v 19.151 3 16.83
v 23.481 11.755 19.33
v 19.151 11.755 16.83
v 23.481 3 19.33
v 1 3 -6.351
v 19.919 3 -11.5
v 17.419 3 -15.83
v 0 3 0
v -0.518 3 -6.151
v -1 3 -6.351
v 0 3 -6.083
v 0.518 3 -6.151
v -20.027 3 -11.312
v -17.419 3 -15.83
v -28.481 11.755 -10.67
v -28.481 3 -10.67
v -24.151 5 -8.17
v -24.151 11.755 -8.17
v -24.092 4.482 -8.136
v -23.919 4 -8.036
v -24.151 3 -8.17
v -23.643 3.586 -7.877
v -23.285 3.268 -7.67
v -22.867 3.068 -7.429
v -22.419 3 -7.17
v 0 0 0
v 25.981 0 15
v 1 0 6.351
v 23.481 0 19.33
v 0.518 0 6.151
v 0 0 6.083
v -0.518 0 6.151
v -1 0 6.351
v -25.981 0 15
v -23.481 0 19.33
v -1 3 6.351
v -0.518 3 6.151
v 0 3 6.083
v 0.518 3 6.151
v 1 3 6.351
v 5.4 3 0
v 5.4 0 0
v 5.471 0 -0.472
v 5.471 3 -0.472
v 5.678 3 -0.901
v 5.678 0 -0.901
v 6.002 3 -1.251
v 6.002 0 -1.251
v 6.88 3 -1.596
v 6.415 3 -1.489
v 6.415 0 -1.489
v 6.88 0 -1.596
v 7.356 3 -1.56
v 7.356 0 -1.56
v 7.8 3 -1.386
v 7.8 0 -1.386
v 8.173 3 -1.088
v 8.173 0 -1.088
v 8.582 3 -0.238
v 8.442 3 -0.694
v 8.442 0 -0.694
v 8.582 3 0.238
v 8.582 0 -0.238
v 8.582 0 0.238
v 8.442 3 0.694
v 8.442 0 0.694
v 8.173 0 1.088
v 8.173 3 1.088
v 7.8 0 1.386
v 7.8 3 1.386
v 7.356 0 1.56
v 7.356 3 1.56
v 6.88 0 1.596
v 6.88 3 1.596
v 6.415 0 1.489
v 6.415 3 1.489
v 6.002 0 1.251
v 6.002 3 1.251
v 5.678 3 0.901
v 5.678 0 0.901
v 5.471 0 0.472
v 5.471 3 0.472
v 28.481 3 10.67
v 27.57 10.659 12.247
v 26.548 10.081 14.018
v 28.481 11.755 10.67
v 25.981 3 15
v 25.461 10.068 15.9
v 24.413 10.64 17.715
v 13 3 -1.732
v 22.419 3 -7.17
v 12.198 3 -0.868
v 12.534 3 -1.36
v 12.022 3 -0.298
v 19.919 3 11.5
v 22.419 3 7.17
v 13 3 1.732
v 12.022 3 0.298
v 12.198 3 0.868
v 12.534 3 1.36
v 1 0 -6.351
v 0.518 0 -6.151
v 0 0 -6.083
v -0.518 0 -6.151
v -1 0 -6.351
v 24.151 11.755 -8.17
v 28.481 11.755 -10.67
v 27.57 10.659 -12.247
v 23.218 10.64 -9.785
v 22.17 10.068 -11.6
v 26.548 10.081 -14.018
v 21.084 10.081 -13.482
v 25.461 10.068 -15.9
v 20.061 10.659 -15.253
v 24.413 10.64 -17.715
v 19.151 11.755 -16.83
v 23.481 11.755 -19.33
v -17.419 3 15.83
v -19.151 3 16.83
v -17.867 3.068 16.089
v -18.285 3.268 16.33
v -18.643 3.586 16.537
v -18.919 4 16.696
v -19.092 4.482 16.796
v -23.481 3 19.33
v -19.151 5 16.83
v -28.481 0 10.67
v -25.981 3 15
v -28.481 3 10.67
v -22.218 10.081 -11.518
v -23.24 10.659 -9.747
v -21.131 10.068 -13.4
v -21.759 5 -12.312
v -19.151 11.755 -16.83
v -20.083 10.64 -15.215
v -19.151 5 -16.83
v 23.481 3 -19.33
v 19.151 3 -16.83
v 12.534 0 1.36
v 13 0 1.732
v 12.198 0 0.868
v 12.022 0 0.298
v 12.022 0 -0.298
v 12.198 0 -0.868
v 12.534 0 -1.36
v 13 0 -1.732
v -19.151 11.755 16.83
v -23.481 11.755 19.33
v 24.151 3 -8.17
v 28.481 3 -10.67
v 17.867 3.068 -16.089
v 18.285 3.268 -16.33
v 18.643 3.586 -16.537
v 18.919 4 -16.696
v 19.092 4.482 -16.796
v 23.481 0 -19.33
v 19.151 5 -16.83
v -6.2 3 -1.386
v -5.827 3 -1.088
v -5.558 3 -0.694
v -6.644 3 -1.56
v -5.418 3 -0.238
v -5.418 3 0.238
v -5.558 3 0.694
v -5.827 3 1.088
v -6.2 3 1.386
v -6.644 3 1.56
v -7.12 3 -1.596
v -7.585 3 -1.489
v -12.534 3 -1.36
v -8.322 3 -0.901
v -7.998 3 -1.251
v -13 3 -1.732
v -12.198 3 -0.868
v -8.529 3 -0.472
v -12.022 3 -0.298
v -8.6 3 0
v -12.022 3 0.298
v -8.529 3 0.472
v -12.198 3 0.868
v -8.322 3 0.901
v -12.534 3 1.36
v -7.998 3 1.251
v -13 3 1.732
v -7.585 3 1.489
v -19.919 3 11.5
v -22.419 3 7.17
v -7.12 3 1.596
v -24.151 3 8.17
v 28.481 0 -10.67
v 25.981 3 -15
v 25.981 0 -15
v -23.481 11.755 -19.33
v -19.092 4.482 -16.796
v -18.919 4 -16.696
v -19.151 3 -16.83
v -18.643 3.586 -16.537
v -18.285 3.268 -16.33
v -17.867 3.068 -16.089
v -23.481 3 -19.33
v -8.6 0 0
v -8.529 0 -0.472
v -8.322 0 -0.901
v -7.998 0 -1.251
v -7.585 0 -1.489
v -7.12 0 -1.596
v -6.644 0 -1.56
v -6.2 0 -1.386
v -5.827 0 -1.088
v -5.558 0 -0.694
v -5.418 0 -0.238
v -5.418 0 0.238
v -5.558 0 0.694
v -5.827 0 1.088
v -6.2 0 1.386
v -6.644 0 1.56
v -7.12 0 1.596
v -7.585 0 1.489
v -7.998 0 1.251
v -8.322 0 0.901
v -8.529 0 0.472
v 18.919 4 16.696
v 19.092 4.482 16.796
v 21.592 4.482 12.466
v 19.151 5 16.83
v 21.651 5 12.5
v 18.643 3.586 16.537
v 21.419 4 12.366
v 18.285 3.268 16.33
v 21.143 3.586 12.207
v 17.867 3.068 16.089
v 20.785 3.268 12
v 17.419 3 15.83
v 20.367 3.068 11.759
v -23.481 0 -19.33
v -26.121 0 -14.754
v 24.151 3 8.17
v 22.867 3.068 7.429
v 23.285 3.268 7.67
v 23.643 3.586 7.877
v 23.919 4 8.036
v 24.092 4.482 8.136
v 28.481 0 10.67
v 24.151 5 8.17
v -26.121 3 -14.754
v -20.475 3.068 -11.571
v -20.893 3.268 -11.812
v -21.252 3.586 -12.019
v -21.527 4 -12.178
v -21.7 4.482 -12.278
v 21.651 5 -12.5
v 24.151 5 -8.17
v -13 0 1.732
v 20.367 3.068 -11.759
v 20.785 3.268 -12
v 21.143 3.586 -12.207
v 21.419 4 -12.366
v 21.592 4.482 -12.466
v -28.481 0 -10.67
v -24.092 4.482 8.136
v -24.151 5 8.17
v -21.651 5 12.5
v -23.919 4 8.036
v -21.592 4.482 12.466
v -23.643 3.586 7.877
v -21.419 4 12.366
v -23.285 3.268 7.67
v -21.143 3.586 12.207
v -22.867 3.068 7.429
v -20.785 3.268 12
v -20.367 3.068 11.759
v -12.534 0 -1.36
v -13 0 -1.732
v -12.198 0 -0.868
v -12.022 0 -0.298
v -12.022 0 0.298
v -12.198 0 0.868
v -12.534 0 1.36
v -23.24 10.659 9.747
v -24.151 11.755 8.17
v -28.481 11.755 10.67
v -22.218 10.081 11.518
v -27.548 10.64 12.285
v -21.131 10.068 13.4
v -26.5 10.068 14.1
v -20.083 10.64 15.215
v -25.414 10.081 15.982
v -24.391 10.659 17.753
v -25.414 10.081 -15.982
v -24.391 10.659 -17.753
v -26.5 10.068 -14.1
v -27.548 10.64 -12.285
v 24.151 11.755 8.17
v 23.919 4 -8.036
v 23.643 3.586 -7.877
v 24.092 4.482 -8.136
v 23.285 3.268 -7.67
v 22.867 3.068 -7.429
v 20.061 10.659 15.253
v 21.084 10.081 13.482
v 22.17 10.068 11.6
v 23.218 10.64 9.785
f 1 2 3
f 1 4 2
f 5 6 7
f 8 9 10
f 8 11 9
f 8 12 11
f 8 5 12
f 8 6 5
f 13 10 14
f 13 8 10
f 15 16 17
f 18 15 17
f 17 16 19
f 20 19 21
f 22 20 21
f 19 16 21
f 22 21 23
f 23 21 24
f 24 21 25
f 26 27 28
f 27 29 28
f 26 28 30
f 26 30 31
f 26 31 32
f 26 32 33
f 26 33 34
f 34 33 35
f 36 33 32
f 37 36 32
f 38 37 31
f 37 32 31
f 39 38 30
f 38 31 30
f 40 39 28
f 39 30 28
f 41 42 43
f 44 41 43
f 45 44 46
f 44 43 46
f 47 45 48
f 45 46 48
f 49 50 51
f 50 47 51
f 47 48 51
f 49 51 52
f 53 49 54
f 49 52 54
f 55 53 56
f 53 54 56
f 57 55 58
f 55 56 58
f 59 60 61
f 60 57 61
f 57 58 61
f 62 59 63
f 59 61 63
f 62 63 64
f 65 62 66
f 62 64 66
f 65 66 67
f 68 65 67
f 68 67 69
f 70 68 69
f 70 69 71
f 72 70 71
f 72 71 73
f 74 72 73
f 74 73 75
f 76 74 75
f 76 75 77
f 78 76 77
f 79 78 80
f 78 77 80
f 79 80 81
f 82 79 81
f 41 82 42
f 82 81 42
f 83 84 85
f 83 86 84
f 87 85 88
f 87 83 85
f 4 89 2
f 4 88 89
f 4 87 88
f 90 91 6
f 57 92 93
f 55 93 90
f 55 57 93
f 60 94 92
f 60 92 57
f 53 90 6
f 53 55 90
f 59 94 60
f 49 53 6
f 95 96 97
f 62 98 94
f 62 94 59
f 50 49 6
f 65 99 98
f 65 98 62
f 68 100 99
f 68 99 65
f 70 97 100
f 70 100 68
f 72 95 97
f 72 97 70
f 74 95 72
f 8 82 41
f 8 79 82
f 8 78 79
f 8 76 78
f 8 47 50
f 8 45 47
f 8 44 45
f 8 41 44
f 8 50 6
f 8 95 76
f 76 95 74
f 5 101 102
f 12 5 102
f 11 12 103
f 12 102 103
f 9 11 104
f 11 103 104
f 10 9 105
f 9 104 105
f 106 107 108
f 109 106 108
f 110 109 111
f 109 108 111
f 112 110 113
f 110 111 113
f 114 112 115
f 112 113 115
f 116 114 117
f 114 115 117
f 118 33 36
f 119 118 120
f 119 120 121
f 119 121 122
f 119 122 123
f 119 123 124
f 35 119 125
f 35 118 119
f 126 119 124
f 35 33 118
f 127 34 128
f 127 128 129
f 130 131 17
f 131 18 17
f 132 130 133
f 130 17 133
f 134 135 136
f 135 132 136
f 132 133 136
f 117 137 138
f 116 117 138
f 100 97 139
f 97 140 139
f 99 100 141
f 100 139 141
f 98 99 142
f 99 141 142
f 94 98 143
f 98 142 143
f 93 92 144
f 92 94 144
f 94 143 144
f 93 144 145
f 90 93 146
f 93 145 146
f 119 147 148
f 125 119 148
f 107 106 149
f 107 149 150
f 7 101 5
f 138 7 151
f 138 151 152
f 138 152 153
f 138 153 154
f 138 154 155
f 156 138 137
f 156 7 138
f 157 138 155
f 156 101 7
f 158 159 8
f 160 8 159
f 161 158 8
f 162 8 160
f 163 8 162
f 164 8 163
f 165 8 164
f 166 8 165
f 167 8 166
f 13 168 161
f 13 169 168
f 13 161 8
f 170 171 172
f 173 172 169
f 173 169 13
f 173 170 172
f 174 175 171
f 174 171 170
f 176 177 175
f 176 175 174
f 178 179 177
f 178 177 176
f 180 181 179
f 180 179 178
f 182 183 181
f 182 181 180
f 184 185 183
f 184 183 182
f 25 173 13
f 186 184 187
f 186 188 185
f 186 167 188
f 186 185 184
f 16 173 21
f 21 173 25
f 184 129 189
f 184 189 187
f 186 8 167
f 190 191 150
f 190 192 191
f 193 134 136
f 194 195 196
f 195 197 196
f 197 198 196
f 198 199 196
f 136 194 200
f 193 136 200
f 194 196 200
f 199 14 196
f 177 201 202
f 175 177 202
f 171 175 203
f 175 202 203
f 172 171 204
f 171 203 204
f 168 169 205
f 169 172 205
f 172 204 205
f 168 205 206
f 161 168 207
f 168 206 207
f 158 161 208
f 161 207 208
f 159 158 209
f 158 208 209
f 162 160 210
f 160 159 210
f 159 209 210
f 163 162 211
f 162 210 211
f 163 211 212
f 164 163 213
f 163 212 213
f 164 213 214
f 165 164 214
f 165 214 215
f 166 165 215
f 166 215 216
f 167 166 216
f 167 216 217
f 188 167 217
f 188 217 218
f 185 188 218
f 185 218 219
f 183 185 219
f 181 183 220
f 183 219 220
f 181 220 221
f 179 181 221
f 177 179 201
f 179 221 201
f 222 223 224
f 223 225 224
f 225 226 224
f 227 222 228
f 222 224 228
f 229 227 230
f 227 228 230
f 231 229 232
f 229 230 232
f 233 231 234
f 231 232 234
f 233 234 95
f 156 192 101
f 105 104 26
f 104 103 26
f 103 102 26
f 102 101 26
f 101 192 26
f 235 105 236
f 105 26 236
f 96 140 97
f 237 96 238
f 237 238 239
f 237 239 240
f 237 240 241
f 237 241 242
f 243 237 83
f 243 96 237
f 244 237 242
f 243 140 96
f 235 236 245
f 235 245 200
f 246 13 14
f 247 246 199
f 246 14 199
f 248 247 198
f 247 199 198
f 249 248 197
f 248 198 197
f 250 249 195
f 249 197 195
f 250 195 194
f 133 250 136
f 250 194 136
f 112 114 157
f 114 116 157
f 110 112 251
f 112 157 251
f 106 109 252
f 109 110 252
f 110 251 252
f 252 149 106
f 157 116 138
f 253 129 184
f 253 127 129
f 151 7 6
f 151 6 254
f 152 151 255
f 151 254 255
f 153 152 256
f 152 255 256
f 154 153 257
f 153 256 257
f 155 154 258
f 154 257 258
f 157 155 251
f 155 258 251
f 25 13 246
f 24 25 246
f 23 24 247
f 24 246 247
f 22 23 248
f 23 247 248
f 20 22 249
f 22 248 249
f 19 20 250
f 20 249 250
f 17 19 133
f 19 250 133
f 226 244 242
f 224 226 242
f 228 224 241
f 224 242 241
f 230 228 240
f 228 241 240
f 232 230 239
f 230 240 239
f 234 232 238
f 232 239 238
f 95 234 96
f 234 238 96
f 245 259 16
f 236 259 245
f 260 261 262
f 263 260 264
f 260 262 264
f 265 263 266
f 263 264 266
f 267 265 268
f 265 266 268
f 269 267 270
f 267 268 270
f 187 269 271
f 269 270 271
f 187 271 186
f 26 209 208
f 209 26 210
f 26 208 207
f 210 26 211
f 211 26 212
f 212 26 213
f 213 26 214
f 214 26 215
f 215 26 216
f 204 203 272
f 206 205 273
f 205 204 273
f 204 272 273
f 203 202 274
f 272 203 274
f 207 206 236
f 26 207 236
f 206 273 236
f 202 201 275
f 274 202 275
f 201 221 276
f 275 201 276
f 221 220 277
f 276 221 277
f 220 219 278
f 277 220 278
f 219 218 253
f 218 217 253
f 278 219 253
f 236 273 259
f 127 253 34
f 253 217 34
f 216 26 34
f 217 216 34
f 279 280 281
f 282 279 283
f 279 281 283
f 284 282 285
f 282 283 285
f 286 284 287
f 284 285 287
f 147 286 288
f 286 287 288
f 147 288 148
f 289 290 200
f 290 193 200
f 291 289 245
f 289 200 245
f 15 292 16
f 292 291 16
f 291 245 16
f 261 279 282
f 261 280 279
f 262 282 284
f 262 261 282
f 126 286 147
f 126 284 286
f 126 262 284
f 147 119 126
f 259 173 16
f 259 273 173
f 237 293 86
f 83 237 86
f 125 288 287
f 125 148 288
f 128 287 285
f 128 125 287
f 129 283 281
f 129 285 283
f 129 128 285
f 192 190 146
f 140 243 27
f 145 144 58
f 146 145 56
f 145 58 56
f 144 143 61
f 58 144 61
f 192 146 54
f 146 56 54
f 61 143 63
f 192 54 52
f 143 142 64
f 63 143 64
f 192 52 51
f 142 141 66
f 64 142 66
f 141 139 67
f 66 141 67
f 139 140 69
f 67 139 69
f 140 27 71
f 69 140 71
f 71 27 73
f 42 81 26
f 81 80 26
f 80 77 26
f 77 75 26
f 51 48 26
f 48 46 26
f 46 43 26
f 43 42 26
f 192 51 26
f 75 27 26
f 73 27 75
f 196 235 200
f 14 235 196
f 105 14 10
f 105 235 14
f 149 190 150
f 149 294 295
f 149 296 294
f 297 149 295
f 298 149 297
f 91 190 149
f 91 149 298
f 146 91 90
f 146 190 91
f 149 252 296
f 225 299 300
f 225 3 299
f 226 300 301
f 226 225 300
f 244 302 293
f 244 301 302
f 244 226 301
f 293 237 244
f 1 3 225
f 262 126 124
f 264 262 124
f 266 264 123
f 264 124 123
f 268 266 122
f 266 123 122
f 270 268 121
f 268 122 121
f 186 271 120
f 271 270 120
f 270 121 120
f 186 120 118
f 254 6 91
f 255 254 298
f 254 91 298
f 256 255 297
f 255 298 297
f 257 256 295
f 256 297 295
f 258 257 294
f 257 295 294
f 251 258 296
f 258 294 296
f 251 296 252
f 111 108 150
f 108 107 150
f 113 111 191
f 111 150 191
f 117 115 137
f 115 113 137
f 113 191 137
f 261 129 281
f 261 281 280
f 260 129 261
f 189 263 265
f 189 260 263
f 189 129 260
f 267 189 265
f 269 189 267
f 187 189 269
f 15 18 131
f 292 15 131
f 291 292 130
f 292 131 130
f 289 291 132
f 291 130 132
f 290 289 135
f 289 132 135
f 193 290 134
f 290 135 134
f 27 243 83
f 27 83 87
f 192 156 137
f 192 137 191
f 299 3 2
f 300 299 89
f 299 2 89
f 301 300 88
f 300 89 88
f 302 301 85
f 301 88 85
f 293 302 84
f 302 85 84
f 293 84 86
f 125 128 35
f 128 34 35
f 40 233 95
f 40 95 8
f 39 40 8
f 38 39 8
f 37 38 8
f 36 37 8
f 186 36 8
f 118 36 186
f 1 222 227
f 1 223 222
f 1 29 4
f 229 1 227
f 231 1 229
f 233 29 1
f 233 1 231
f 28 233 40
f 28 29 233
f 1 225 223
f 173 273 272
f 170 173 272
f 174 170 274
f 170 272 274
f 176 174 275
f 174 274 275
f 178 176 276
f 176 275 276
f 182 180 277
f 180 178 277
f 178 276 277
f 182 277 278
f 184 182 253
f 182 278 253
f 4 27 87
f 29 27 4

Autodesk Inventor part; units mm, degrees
ref_plane "YZ Plane" through (0, 0, 0) normal (1, 0, 0) x (0, 1, 0)
ref_plane "XZ Plane" through (0, 0, 0) normal (0, 1, 0) x (-1, 0, 0)
ref_plane "XY Plane" through (0, 0, 0) normal (0, 0, 1) x (1, 0, 0)
sketch "Sketch1" plane through (0, 0, 0) normal (0, 1, 0) x (-1, 0, 0)
  arc A0 (-1, 6.3509) -> (1, 6.3509) centre (0, 8.0829) ccw
  arc A1 (-12.9998, -1.7321) -> (-12.9998, 1.7321) centre (-13.9998, 0) ccw
  arc A2 (1, -6.3509) -> (-1, -6.3509) centre (0, -8.0829) ccw
  arc A3 (13, 1.7321) -> (13, -1.7321) centre (14, 0) ccw
  circle A4 centre (7, 0) radius 1.6
  circle A5 centre (-7, 0) radius 1.6
  line L0 (0, 0) -> (26.1212, -14.7541)
  line L1 (0, 0) -> (25.9808, 15)
  line L2 (0, 0) -> (30, 0) construction
  line L3 (0, 0) -> (-25.9808, -15)
  line L4 (0, 0) -> (-25.9808, 15)
  line L5 (0, 0) -> (30, 0) construction
  line L6 (25.9808, 15) -> (28.4808, 10.6699)
  line L7 (25.9808, 15) -> (23.4808, 19.3301)
  line L8 (1, 6.3509) -> (23.4808, 19.3301)
  line L9 (28.4808, 10.6699) -> (13, 1.7321)
  line L10 (13, -1.7321) -> (28.4808, -10.6699)
  line L11 (28.4808, -10.6699) -> (23.4808, -19.3301)
  line L12 (23.4808, -19.3301) -> (1, -6.3509)
  line L13 (-1, -6.3509) -> (-23.4808, -19.3301)
  line L14 (-23.4808, -19.3301) -> (-28.4807, -10.6699)
  line L15 (-28.4807, -10.6699) -> (-12.9998, -1.7321)
  line L16 (-12.9998, 1.7321) -> (-28.4807, 10.6699)
  line L17 (-28.4807, 10.6699) -> (-23.4808, 19.3301)
  line L18 (-23.4808, 19.3301) -> (-1, 6.3509)
  dimension "d0" = 3.2
  dimension "d1" = 30
  dimension "d2" = 30
  dimension "d3" = 30
  dimension "d4" = 30
  dimension "d5" = 30
  dimension "d6" = 150
extrude "Extrusion1" add sketch "Sketch1" along normal blind 3
sketch "Sketch2" plane through (0, 3, 0) normal (0, 1, 0) x (1, 0, 0)
  line L0 (-23.4808, -19.3301) -> (-28.4808, -10.6699)
  line L1 (-28.4808, -10.6699) -> (-24.1506, -8.1699)
  line L2 (-24.1506, -8.1699) -> (-19.1506, -16.8301)
  line L3 (-19.1506, -16.8301) -> (-23.4808, -19.3301)
  line L4 (-28.4808, -10.6699) -> (-23.4808, -19.3301) projected
  line L5 (-23.4808, 19.3301) -> (-28.4808, 10.6699)
  line L6 (-28.4808, 10.6699) -> (-24.1506, 8.1699)
  line L7 (-24.1506, 8.1699) -> (-19.1506, 16.8301)
  line L8 (-19.1506, 16.8301) -> (-23.4808, 19.3301)
  line L9 (-1, 6.3509) -> (-23.4808, 19.3301) projected
  line L10 (28.4807, 10.6699) -> (23.4808, 19.3301)
  line L11 (23.4808, 19.3301) -> (19.1506, 16.8301)
  line L12 (19.1506, 16.8301) -> (24.1506, 8.1699)
  line L13 (24.1506, 8.1699) -> (28.4807, 10.6699)
  line L14 (28.4807, -10.6699) -> (23.4808, -19.3301)
  line L15 (23.4808, -19.3301) -> (19.1506, -16.8301)
  line L16 (19.1506, -16.8301) -> (24.1506, -8.1699)
  line L17 (24.1506, -8.1699) -> (28.4807, -10.6699)
  line L18 (23.4808, -19.3301) -> (28.4807, -10.6699) projected
  point P0 (0, 0)
  dimension "d9" = 5
  dimension "d10" = 5
  dimension "d11" = 5
  dimension "d12" = 5
extrude "Extrusion2" add sketch "Sketch2" along normal blind 15
fillet "Fillet1" radius 2 4 edges at (-21.6506, 3, 12.5) (-21.6506, 3, -12.5) (21.6506, 3, -12.5) (21.6506, 3, 12.5)
sketch "Sketch3" plane through (-19.1506, 5, -16.8301) normal (0.866, 0, 0.5) x (0.5, 0, -0.866)
  line L0 (-10, 13) -> (0, 13) projected
  circle A0 centre (-5, 13) radius 8
  point P0 (-5, -5)
  dimension "d16" = 16
extrude "Extrusion3" cut sketch "Sketch3" against normal blind 13
sketch "Sketch4" plane through (23.4808, 0, -19.3301) normal (0.866, 0, -0.5) x (-0.5, 0, -0.866)
  line L0 (0, 18) -> (-9.9999, 18) projected
  circle A0 centre (-5, 18) radius 8
  point P0 (-5, 0)
  dimension "d19" = 16
extrude "Extrusion4" cut sketch "Sketch4" against normal blind 13
sketch "Sketch5" plane through (28.4807, 0, 10.6699) normal (0.866, 0, 0.5) x (0.5, 0, -0.866)
  line L0 (-9.9999, 18) -> (0, 18) projected
  circle A0 centre (-5, 18) radius 8
  point P0 (-4.9999, 0)
  dimension "d22" = 16
extrude "Extrusion5" cut sketch "Sketch5" against normal blind 10
sketch "Sketch6" plane through (-23.4808, 0, 19.3301) normal (-0.866, 0, 0.5) x (0.5, 0, 0.866)
  line L0 (0, 18) -> (-10, 18) projected
  circle A0 centre (-5, 18) radius 8
  point P0 (-5, 0)
  dimension "d25" = 16
extrude "Extrusion6" cut sketch "Sketch6" against normal blind 10
properties part number "Motor Support" material "ABS Plastic"
